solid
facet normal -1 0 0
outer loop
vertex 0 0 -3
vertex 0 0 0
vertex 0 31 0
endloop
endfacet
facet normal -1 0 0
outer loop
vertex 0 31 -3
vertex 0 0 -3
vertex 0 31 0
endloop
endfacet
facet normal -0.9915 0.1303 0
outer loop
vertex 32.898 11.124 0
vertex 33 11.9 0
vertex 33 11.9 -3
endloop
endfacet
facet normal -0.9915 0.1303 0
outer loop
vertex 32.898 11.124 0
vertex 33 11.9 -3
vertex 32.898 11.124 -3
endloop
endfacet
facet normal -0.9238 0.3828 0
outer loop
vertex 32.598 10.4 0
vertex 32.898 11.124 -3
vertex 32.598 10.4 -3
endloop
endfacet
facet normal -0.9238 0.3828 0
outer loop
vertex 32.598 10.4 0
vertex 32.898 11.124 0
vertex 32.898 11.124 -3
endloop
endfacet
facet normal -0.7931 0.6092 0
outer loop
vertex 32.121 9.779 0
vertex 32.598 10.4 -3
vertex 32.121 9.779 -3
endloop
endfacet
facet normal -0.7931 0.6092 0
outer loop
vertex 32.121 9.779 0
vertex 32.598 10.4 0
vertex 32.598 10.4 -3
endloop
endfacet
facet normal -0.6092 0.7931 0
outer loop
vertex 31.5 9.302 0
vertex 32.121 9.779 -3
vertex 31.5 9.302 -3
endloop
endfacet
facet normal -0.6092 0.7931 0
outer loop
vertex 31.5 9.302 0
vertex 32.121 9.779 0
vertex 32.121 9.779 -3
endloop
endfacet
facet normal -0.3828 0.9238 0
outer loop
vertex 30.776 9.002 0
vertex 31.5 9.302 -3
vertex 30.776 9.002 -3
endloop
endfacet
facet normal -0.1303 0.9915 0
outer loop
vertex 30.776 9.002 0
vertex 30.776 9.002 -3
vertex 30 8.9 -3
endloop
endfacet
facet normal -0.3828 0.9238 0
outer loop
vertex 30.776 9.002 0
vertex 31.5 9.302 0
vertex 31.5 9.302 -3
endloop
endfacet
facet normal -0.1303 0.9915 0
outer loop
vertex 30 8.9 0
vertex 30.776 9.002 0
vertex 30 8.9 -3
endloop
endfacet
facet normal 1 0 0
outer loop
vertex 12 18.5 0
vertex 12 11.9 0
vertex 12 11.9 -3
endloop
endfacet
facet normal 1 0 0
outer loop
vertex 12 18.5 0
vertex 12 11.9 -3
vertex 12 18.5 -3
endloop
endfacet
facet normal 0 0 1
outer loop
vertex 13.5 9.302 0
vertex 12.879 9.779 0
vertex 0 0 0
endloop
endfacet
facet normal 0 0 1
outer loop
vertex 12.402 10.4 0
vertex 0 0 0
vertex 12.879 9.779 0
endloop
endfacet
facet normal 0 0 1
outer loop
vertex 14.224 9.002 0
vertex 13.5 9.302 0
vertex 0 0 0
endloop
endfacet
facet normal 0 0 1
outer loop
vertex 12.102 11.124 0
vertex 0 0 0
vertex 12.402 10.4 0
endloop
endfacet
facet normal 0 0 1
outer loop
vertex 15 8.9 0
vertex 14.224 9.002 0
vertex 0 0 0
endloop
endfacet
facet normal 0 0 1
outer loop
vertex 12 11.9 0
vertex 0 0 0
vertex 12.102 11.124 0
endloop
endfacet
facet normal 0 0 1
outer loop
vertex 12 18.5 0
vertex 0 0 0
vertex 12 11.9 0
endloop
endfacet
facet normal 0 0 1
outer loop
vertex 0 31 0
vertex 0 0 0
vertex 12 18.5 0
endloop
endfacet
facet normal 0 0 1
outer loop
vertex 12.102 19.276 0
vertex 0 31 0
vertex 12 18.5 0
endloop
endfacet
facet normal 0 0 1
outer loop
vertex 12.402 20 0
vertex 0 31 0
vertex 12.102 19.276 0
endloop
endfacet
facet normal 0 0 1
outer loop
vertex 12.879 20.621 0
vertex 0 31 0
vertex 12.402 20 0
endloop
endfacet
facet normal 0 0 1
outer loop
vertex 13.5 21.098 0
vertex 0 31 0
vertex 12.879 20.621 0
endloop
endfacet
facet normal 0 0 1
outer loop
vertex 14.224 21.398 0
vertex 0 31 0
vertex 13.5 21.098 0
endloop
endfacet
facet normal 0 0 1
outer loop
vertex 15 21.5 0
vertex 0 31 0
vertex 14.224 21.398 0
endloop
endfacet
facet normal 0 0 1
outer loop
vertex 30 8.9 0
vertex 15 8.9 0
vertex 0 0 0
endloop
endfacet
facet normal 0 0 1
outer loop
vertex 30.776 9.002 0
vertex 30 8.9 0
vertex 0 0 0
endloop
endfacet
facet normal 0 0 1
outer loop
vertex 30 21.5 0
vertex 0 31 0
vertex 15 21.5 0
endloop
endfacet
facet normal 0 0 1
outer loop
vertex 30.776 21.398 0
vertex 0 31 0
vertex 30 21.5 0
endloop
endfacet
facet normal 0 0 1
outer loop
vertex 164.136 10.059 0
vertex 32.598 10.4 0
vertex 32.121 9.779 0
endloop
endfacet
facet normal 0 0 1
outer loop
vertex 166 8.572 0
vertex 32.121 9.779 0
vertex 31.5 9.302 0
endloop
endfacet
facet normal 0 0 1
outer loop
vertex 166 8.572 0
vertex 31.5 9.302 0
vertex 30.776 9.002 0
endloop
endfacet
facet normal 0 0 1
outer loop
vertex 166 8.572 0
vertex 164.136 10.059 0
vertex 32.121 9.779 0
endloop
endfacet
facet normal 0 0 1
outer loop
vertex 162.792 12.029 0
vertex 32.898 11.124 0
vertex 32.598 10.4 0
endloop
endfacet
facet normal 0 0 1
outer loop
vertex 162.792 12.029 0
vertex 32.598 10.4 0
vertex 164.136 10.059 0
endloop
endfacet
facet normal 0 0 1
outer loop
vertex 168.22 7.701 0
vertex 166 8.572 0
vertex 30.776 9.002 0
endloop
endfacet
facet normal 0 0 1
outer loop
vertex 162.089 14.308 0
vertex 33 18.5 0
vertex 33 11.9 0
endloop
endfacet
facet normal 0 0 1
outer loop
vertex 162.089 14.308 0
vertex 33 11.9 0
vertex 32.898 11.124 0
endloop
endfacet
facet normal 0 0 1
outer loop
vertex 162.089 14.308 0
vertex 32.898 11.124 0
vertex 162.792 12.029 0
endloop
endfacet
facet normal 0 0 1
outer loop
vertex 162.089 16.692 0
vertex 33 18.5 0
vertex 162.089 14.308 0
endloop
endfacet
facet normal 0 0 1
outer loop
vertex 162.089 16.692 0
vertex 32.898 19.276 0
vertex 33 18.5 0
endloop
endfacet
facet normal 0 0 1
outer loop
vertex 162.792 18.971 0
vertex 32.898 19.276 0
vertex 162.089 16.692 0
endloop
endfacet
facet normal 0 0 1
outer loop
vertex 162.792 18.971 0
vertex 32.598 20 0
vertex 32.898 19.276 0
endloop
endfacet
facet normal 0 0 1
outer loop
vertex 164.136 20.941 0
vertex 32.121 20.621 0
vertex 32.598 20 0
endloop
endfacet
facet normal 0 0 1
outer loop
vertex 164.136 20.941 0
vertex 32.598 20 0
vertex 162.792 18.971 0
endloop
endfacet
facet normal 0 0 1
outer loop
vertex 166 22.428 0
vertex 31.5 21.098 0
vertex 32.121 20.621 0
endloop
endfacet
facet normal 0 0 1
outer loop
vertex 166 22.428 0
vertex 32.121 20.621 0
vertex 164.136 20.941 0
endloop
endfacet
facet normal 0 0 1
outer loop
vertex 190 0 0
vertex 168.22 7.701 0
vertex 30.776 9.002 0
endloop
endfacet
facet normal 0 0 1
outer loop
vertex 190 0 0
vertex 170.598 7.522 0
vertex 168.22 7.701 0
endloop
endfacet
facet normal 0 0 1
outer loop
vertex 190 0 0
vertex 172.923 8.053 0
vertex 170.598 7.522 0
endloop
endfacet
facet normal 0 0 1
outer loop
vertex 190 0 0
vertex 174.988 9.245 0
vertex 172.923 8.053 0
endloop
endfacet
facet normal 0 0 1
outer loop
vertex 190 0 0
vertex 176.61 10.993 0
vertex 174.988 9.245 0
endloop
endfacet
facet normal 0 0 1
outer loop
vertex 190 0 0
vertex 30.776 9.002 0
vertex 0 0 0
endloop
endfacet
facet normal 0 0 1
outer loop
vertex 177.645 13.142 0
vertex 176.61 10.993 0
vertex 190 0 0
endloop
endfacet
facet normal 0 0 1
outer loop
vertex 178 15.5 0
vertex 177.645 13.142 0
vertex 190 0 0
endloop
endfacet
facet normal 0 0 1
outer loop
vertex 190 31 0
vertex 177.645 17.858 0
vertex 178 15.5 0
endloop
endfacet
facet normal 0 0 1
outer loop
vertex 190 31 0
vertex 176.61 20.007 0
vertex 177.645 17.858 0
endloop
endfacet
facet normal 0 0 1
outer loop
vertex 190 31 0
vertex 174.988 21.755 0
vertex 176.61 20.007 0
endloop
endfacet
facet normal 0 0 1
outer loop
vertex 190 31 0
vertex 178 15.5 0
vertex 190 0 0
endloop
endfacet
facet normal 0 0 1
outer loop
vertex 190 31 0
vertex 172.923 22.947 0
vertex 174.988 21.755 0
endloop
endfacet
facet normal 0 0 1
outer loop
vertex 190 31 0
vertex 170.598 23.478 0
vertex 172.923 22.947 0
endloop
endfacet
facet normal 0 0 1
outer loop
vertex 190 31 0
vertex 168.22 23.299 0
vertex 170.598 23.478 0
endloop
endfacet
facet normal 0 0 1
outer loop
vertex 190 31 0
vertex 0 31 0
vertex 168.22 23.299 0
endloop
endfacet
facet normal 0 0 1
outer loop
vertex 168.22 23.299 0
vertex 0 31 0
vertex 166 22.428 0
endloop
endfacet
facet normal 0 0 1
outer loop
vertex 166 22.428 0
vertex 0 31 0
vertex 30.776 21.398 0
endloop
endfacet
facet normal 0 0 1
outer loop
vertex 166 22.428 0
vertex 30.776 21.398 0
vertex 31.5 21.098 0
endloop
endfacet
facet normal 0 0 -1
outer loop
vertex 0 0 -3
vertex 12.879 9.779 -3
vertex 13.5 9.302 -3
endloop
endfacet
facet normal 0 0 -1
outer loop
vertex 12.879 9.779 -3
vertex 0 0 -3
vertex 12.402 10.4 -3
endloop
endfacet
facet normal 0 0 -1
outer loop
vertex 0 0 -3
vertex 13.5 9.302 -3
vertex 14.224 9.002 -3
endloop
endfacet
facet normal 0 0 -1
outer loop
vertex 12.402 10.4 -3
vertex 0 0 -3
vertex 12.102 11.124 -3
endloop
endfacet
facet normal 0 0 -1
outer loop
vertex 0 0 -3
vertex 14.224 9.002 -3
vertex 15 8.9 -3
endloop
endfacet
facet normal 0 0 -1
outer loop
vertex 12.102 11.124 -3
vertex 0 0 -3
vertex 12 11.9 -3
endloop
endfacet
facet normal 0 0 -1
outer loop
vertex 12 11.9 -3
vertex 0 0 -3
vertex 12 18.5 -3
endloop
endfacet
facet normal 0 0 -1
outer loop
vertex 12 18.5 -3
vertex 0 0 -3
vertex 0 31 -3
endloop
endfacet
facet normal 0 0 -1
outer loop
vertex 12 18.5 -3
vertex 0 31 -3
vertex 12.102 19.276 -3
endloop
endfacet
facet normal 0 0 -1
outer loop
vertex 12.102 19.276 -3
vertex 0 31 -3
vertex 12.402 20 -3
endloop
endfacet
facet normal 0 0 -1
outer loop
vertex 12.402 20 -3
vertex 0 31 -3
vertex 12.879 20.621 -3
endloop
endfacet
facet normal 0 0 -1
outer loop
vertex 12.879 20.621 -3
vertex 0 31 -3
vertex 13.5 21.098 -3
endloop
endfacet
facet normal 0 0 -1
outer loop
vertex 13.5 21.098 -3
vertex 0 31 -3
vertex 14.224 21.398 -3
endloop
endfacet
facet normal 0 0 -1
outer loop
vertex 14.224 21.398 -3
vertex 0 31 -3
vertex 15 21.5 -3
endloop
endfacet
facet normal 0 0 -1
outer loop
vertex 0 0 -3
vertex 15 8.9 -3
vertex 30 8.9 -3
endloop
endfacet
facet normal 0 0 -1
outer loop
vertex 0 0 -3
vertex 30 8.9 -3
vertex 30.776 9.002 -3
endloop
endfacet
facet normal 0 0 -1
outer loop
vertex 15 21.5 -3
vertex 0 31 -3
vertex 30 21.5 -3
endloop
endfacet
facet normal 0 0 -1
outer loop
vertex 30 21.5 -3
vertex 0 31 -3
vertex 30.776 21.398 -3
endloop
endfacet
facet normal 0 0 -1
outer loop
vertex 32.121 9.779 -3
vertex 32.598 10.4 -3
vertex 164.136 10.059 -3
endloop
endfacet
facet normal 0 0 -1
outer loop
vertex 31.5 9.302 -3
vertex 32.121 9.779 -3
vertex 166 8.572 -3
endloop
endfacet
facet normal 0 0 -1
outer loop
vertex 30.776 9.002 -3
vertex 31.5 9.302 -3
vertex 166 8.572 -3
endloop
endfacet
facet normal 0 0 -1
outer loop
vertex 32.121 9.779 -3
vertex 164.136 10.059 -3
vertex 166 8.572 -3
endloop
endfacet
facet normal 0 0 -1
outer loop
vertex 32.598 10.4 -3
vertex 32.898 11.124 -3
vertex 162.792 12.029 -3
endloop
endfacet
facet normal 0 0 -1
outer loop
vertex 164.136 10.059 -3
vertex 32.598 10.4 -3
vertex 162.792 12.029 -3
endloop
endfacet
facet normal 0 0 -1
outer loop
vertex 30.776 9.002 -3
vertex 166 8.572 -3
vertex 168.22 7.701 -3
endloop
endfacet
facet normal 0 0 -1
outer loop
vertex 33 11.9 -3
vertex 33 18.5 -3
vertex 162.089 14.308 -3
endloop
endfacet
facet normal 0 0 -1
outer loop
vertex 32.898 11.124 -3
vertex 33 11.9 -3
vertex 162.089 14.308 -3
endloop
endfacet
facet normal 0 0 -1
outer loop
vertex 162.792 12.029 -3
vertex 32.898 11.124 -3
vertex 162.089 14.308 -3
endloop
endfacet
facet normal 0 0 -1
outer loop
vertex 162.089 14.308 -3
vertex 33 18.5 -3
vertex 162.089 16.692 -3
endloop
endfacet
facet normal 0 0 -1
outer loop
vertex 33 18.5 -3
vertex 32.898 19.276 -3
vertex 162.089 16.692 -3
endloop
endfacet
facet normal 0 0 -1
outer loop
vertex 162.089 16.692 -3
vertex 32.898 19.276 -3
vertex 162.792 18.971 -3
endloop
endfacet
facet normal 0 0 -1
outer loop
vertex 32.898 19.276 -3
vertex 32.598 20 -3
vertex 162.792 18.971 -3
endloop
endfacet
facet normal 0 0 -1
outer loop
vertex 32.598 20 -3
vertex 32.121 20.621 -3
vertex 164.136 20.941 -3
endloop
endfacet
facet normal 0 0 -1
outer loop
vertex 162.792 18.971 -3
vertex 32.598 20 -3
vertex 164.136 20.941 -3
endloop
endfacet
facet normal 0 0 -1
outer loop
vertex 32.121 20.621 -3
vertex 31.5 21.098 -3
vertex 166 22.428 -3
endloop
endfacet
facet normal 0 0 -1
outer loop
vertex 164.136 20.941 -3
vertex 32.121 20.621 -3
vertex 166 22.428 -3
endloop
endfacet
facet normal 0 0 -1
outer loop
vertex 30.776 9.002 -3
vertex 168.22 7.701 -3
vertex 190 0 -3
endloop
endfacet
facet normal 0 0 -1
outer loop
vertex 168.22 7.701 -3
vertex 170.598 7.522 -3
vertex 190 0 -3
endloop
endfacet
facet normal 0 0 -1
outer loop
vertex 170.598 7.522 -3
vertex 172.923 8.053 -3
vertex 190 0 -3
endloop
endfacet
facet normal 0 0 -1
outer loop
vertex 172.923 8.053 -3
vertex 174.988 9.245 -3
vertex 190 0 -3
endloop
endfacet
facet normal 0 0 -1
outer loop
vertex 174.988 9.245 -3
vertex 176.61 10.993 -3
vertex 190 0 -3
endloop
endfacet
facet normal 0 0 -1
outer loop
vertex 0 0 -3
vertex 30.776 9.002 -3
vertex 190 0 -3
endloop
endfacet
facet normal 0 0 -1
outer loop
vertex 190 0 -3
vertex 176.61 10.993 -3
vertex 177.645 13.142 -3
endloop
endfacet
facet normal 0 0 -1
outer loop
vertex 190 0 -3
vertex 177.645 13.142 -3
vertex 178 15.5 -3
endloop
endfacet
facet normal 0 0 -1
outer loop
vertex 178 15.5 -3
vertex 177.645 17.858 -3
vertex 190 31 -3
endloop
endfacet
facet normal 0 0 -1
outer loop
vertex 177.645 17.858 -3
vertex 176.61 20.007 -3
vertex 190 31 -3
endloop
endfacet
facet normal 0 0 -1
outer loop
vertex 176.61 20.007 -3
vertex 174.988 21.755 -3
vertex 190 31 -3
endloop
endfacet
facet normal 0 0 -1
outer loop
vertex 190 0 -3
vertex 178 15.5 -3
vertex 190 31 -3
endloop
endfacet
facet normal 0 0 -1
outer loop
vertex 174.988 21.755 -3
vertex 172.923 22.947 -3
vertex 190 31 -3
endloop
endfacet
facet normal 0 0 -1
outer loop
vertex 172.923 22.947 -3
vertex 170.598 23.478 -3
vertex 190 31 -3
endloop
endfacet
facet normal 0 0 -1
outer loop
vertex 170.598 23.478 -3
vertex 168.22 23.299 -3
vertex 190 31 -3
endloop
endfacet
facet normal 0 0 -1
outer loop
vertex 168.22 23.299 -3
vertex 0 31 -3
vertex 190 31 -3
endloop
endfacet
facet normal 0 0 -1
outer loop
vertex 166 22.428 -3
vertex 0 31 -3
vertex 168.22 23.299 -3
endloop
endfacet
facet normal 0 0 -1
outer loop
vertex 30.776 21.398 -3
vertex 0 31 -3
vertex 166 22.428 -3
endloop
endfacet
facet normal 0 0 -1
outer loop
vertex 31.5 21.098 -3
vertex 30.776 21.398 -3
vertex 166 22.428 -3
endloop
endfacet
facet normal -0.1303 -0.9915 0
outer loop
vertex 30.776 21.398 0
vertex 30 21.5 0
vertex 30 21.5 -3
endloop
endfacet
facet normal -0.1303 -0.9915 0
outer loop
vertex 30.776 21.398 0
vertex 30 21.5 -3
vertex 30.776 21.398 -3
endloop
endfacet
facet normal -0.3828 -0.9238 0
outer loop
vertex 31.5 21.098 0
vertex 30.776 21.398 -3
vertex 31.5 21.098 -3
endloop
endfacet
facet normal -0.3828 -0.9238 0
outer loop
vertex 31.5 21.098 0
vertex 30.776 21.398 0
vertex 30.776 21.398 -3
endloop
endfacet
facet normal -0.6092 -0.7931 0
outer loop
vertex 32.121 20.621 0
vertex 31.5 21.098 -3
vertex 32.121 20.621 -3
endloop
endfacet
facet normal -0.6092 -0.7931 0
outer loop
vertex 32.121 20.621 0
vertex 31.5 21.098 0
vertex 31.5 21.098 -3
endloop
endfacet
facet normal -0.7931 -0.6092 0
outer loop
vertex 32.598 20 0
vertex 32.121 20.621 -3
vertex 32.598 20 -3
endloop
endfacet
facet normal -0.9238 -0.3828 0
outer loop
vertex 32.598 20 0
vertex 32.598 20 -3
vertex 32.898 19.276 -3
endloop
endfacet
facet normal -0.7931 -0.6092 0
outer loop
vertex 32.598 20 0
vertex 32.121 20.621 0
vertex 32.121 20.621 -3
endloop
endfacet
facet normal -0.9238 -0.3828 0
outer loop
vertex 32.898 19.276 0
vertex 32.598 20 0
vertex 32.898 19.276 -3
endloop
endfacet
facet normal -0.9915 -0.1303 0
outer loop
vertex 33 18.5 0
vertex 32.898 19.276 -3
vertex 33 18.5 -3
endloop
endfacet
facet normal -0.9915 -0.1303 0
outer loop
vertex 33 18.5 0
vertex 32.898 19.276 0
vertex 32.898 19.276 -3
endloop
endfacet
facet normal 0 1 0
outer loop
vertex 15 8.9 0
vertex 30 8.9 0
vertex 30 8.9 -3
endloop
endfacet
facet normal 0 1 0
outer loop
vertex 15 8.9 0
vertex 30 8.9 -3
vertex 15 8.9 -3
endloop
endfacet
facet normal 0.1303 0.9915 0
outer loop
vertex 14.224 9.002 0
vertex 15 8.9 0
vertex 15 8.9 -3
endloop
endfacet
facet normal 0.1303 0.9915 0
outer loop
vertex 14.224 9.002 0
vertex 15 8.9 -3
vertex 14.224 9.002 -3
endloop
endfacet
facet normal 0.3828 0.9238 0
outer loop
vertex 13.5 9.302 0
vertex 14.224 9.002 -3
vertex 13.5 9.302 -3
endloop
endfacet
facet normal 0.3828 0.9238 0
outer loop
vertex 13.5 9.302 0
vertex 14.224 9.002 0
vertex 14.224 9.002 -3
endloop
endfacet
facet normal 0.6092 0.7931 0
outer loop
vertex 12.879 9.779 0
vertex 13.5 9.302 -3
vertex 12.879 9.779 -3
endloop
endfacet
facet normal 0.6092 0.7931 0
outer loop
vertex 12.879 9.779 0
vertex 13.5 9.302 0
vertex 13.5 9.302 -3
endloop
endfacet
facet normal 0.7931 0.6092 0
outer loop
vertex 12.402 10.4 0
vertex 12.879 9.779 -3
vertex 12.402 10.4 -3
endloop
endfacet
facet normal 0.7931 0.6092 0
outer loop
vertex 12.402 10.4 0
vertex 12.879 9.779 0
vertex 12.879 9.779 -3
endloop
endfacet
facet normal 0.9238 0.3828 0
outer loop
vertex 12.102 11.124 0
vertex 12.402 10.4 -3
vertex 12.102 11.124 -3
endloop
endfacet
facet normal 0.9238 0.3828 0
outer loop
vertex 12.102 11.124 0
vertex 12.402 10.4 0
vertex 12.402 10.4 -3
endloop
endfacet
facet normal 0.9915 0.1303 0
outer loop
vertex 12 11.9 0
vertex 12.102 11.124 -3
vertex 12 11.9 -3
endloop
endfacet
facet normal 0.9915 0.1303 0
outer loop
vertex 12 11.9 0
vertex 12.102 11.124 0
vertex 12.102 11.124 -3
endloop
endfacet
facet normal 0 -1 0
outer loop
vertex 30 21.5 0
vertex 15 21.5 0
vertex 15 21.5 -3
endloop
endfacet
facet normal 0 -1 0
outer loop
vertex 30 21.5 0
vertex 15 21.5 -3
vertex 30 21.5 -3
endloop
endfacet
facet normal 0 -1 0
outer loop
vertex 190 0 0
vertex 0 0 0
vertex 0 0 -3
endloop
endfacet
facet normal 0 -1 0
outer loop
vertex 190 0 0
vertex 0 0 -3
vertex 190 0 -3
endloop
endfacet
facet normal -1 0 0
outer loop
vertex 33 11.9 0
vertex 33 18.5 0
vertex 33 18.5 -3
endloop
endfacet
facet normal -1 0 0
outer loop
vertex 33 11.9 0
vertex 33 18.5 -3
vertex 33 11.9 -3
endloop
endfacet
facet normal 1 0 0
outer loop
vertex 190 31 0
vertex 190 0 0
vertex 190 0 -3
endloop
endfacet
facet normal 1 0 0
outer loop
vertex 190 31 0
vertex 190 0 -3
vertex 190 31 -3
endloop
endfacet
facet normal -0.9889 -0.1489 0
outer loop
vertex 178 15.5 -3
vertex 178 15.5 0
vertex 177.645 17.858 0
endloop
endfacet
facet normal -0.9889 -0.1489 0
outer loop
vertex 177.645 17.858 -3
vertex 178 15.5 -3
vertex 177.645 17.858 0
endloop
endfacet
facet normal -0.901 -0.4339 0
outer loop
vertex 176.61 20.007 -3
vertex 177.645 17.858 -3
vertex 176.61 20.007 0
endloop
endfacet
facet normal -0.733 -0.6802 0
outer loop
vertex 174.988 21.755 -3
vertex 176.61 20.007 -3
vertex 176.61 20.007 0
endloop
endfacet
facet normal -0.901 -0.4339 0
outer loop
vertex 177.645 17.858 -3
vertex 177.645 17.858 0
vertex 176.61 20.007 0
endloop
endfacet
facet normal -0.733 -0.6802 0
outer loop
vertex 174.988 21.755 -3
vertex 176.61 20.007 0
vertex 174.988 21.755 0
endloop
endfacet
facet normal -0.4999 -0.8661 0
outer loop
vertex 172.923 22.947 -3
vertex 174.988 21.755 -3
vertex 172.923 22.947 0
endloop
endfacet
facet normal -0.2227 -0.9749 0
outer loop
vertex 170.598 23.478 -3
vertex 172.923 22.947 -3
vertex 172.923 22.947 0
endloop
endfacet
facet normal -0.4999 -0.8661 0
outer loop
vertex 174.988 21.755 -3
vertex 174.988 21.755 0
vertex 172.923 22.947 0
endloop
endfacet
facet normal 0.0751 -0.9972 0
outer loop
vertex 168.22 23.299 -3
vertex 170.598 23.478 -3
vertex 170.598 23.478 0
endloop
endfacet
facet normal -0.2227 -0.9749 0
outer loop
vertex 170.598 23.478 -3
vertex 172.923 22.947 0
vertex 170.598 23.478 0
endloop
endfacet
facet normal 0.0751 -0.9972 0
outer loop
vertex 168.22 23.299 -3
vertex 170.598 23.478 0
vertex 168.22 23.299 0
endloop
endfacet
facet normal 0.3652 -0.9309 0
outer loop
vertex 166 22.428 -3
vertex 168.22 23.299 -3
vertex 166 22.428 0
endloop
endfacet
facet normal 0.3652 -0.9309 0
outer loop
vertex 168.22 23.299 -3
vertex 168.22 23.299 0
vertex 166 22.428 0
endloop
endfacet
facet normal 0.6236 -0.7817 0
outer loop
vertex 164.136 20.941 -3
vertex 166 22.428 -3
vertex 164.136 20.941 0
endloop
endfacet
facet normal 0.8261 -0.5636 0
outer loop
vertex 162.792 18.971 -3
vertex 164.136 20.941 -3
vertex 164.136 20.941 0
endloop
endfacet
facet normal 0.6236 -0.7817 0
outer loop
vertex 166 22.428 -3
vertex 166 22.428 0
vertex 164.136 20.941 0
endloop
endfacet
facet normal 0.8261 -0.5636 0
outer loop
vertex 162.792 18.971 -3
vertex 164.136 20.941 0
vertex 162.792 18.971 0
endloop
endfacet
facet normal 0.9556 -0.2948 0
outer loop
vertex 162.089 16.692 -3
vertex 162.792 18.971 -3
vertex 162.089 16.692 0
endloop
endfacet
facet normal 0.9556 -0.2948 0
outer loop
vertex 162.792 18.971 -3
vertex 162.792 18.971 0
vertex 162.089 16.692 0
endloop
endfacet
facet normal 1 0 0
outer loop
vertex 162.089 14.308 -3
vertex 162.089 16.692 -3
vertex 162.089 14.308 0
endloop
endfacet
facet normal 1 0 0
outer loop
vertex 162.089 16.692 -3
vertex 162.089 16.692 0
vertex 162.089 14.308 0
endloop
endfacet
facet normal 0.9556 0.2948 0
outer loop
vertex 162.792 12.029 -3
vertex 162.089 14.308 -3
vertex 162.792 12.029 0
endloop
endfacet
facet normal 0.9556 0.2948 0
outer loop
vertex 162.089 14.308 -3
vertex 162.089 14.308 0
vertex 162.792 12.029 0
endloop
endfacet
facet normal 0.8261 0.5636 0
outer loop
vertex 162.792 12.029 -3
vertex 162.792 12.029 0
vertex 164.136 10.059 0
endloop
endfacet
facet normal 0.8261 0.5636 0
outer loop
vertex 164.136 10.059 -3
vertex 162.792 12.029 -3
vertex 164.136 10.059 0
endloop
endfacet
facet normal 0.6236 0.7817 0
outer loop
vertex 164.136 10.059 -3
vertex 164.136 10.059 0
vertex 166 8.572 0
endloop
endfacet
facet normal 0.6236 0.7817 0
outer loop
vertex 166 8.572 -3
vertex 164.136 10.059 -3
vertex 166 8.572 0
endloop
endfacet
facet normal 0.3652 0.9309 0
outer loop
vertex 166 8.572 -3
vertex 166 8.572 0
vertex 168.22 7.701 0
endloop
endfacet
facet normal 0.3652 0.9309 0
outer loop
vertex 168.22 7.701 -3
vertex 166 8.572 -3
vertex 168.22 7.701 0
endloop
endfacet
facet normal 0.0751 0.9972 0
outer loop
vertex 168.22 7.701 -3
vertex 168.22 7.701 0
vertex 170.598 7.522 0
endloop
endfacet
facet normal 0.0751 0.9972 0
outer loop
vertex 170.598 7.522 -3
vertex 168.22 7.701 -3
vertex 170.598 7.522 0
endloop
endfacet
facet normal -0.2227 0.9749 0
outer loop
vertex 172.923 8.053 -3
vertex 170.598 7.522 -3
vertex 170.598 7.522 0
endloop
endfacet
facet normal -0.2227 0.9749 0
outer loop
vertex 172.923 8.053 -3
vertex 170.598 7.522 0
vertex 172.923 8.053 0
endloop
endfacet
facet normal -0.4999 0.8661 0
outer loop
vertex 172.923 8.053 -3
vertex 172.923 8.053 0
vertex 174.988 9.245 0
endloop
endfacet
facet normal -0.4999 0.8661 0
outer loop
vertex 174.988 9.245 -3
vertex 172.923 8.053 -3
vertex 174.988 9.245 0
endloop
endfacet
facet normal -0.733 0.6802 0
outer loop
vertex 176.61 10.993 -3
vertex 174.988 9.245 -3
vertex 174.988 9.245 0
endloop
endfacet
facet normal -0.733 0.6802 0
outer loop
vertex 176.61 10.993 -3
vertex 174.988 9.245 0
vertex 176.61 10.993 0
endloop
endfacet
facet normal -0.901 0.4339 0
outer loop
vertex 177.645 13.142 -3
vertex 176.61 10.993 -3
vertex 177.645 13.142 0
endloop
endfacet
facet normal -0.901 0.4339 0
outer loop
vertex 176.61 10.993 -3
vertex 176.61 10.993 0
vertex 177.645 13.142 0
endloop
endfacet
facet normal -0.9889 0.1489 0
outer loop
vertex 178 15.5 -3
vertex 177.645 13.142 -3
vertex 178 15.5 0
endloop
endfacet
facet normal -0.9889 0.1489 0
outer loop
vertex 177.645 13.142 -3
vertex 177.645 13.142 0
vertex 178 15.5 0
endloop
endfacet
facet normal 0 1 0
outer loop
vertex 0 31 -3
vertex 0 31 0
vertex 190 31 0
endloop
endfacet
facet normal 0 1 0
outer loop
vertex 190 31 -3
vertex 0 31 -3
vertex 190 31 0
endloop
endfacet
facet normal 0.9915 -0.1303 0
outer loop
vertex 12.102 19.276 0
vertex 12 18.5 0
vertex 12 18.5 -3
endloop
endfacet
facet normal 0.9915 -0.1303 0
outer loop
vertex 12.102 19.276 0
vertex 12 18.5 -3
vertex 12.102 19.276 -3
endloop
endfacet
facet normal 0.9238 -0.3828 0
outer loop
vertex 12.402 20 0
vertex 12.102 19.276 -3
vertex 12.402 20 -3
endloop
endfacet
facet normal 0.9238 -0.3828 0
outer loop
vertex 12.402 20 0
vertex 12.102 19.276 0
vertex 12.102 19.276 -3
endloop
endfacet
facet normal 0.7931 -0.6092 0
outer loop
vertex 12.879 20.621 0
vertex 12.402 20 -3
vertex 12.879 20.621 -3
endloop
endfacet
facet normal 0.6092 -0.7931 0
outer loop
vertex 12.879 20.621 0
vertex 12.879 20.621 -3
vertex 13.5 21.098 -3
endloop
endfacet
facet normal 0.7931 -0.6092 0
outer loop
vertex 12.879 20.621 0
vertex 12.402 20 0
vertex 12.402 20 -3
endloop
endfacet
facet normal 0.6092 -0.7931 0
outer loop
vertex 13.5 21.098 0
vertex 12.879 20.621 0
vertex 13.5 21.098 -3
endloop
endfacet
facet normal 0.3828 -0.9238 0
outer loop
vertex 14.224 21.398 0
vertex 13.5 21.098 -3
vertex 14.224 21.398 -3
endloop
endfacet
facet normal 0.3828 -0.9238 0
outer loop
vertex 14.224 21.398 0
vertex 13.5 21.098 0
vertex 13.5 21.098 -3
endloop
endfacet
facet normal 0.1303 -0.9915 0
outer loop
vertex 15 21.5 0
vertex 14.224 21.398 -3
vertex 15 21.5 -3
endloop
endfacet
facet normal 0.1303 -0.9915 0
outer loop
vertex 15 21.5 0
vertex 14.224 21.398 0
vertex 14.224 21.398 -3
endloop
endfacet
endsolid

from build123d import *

# Parameters (mm, degrees)
SKETCH1_W          = 190
SKETCH1_H          = 31
SKETCH1_R          = 8
BASE_FLANGE1_DEPTH = 3


# Sheet-metal steps are written as plain solids
with BuildPart() as part:
    # Sketch1 → Base-Flange1 (new body)
    with BuildSketch(Plane.XY):
        with Locations((95, 15.5)):
            Rectangle(SKETCH1_W, SKETCH1_H)
        with Locations((170, 15.5)):
            Circle(SKETCH1_R, mode=Mode.SUBTRACT)
        with BuildLine():
            Line((15, 21.5), (30, 21.5))
            ThreePointArc((30, 21.5), (32.121320344, 20.621320344), (33, 18.5))
            Line((33, 18.5), (33, 11.9))
            ThreePointArc((33, 11.9), (32.121320344, 9.778679656), (30, 8.9))
            Line((30, 8.9), (15, 8.9))
            ThreePointArc((15, 8.9), (12.878679656, 9.778679656), (12, 11.9))
            Line((12, 11.9), (12, 18.5))
            ThreePointArc((12, 18.5), (12.878679656, 20.621320344), (15, 21.5))
        make_face(mode=Mode.SUBTRACT)
    extrude(amount=-BASE_FLANGE1_DEPTH)


solid = part.part
